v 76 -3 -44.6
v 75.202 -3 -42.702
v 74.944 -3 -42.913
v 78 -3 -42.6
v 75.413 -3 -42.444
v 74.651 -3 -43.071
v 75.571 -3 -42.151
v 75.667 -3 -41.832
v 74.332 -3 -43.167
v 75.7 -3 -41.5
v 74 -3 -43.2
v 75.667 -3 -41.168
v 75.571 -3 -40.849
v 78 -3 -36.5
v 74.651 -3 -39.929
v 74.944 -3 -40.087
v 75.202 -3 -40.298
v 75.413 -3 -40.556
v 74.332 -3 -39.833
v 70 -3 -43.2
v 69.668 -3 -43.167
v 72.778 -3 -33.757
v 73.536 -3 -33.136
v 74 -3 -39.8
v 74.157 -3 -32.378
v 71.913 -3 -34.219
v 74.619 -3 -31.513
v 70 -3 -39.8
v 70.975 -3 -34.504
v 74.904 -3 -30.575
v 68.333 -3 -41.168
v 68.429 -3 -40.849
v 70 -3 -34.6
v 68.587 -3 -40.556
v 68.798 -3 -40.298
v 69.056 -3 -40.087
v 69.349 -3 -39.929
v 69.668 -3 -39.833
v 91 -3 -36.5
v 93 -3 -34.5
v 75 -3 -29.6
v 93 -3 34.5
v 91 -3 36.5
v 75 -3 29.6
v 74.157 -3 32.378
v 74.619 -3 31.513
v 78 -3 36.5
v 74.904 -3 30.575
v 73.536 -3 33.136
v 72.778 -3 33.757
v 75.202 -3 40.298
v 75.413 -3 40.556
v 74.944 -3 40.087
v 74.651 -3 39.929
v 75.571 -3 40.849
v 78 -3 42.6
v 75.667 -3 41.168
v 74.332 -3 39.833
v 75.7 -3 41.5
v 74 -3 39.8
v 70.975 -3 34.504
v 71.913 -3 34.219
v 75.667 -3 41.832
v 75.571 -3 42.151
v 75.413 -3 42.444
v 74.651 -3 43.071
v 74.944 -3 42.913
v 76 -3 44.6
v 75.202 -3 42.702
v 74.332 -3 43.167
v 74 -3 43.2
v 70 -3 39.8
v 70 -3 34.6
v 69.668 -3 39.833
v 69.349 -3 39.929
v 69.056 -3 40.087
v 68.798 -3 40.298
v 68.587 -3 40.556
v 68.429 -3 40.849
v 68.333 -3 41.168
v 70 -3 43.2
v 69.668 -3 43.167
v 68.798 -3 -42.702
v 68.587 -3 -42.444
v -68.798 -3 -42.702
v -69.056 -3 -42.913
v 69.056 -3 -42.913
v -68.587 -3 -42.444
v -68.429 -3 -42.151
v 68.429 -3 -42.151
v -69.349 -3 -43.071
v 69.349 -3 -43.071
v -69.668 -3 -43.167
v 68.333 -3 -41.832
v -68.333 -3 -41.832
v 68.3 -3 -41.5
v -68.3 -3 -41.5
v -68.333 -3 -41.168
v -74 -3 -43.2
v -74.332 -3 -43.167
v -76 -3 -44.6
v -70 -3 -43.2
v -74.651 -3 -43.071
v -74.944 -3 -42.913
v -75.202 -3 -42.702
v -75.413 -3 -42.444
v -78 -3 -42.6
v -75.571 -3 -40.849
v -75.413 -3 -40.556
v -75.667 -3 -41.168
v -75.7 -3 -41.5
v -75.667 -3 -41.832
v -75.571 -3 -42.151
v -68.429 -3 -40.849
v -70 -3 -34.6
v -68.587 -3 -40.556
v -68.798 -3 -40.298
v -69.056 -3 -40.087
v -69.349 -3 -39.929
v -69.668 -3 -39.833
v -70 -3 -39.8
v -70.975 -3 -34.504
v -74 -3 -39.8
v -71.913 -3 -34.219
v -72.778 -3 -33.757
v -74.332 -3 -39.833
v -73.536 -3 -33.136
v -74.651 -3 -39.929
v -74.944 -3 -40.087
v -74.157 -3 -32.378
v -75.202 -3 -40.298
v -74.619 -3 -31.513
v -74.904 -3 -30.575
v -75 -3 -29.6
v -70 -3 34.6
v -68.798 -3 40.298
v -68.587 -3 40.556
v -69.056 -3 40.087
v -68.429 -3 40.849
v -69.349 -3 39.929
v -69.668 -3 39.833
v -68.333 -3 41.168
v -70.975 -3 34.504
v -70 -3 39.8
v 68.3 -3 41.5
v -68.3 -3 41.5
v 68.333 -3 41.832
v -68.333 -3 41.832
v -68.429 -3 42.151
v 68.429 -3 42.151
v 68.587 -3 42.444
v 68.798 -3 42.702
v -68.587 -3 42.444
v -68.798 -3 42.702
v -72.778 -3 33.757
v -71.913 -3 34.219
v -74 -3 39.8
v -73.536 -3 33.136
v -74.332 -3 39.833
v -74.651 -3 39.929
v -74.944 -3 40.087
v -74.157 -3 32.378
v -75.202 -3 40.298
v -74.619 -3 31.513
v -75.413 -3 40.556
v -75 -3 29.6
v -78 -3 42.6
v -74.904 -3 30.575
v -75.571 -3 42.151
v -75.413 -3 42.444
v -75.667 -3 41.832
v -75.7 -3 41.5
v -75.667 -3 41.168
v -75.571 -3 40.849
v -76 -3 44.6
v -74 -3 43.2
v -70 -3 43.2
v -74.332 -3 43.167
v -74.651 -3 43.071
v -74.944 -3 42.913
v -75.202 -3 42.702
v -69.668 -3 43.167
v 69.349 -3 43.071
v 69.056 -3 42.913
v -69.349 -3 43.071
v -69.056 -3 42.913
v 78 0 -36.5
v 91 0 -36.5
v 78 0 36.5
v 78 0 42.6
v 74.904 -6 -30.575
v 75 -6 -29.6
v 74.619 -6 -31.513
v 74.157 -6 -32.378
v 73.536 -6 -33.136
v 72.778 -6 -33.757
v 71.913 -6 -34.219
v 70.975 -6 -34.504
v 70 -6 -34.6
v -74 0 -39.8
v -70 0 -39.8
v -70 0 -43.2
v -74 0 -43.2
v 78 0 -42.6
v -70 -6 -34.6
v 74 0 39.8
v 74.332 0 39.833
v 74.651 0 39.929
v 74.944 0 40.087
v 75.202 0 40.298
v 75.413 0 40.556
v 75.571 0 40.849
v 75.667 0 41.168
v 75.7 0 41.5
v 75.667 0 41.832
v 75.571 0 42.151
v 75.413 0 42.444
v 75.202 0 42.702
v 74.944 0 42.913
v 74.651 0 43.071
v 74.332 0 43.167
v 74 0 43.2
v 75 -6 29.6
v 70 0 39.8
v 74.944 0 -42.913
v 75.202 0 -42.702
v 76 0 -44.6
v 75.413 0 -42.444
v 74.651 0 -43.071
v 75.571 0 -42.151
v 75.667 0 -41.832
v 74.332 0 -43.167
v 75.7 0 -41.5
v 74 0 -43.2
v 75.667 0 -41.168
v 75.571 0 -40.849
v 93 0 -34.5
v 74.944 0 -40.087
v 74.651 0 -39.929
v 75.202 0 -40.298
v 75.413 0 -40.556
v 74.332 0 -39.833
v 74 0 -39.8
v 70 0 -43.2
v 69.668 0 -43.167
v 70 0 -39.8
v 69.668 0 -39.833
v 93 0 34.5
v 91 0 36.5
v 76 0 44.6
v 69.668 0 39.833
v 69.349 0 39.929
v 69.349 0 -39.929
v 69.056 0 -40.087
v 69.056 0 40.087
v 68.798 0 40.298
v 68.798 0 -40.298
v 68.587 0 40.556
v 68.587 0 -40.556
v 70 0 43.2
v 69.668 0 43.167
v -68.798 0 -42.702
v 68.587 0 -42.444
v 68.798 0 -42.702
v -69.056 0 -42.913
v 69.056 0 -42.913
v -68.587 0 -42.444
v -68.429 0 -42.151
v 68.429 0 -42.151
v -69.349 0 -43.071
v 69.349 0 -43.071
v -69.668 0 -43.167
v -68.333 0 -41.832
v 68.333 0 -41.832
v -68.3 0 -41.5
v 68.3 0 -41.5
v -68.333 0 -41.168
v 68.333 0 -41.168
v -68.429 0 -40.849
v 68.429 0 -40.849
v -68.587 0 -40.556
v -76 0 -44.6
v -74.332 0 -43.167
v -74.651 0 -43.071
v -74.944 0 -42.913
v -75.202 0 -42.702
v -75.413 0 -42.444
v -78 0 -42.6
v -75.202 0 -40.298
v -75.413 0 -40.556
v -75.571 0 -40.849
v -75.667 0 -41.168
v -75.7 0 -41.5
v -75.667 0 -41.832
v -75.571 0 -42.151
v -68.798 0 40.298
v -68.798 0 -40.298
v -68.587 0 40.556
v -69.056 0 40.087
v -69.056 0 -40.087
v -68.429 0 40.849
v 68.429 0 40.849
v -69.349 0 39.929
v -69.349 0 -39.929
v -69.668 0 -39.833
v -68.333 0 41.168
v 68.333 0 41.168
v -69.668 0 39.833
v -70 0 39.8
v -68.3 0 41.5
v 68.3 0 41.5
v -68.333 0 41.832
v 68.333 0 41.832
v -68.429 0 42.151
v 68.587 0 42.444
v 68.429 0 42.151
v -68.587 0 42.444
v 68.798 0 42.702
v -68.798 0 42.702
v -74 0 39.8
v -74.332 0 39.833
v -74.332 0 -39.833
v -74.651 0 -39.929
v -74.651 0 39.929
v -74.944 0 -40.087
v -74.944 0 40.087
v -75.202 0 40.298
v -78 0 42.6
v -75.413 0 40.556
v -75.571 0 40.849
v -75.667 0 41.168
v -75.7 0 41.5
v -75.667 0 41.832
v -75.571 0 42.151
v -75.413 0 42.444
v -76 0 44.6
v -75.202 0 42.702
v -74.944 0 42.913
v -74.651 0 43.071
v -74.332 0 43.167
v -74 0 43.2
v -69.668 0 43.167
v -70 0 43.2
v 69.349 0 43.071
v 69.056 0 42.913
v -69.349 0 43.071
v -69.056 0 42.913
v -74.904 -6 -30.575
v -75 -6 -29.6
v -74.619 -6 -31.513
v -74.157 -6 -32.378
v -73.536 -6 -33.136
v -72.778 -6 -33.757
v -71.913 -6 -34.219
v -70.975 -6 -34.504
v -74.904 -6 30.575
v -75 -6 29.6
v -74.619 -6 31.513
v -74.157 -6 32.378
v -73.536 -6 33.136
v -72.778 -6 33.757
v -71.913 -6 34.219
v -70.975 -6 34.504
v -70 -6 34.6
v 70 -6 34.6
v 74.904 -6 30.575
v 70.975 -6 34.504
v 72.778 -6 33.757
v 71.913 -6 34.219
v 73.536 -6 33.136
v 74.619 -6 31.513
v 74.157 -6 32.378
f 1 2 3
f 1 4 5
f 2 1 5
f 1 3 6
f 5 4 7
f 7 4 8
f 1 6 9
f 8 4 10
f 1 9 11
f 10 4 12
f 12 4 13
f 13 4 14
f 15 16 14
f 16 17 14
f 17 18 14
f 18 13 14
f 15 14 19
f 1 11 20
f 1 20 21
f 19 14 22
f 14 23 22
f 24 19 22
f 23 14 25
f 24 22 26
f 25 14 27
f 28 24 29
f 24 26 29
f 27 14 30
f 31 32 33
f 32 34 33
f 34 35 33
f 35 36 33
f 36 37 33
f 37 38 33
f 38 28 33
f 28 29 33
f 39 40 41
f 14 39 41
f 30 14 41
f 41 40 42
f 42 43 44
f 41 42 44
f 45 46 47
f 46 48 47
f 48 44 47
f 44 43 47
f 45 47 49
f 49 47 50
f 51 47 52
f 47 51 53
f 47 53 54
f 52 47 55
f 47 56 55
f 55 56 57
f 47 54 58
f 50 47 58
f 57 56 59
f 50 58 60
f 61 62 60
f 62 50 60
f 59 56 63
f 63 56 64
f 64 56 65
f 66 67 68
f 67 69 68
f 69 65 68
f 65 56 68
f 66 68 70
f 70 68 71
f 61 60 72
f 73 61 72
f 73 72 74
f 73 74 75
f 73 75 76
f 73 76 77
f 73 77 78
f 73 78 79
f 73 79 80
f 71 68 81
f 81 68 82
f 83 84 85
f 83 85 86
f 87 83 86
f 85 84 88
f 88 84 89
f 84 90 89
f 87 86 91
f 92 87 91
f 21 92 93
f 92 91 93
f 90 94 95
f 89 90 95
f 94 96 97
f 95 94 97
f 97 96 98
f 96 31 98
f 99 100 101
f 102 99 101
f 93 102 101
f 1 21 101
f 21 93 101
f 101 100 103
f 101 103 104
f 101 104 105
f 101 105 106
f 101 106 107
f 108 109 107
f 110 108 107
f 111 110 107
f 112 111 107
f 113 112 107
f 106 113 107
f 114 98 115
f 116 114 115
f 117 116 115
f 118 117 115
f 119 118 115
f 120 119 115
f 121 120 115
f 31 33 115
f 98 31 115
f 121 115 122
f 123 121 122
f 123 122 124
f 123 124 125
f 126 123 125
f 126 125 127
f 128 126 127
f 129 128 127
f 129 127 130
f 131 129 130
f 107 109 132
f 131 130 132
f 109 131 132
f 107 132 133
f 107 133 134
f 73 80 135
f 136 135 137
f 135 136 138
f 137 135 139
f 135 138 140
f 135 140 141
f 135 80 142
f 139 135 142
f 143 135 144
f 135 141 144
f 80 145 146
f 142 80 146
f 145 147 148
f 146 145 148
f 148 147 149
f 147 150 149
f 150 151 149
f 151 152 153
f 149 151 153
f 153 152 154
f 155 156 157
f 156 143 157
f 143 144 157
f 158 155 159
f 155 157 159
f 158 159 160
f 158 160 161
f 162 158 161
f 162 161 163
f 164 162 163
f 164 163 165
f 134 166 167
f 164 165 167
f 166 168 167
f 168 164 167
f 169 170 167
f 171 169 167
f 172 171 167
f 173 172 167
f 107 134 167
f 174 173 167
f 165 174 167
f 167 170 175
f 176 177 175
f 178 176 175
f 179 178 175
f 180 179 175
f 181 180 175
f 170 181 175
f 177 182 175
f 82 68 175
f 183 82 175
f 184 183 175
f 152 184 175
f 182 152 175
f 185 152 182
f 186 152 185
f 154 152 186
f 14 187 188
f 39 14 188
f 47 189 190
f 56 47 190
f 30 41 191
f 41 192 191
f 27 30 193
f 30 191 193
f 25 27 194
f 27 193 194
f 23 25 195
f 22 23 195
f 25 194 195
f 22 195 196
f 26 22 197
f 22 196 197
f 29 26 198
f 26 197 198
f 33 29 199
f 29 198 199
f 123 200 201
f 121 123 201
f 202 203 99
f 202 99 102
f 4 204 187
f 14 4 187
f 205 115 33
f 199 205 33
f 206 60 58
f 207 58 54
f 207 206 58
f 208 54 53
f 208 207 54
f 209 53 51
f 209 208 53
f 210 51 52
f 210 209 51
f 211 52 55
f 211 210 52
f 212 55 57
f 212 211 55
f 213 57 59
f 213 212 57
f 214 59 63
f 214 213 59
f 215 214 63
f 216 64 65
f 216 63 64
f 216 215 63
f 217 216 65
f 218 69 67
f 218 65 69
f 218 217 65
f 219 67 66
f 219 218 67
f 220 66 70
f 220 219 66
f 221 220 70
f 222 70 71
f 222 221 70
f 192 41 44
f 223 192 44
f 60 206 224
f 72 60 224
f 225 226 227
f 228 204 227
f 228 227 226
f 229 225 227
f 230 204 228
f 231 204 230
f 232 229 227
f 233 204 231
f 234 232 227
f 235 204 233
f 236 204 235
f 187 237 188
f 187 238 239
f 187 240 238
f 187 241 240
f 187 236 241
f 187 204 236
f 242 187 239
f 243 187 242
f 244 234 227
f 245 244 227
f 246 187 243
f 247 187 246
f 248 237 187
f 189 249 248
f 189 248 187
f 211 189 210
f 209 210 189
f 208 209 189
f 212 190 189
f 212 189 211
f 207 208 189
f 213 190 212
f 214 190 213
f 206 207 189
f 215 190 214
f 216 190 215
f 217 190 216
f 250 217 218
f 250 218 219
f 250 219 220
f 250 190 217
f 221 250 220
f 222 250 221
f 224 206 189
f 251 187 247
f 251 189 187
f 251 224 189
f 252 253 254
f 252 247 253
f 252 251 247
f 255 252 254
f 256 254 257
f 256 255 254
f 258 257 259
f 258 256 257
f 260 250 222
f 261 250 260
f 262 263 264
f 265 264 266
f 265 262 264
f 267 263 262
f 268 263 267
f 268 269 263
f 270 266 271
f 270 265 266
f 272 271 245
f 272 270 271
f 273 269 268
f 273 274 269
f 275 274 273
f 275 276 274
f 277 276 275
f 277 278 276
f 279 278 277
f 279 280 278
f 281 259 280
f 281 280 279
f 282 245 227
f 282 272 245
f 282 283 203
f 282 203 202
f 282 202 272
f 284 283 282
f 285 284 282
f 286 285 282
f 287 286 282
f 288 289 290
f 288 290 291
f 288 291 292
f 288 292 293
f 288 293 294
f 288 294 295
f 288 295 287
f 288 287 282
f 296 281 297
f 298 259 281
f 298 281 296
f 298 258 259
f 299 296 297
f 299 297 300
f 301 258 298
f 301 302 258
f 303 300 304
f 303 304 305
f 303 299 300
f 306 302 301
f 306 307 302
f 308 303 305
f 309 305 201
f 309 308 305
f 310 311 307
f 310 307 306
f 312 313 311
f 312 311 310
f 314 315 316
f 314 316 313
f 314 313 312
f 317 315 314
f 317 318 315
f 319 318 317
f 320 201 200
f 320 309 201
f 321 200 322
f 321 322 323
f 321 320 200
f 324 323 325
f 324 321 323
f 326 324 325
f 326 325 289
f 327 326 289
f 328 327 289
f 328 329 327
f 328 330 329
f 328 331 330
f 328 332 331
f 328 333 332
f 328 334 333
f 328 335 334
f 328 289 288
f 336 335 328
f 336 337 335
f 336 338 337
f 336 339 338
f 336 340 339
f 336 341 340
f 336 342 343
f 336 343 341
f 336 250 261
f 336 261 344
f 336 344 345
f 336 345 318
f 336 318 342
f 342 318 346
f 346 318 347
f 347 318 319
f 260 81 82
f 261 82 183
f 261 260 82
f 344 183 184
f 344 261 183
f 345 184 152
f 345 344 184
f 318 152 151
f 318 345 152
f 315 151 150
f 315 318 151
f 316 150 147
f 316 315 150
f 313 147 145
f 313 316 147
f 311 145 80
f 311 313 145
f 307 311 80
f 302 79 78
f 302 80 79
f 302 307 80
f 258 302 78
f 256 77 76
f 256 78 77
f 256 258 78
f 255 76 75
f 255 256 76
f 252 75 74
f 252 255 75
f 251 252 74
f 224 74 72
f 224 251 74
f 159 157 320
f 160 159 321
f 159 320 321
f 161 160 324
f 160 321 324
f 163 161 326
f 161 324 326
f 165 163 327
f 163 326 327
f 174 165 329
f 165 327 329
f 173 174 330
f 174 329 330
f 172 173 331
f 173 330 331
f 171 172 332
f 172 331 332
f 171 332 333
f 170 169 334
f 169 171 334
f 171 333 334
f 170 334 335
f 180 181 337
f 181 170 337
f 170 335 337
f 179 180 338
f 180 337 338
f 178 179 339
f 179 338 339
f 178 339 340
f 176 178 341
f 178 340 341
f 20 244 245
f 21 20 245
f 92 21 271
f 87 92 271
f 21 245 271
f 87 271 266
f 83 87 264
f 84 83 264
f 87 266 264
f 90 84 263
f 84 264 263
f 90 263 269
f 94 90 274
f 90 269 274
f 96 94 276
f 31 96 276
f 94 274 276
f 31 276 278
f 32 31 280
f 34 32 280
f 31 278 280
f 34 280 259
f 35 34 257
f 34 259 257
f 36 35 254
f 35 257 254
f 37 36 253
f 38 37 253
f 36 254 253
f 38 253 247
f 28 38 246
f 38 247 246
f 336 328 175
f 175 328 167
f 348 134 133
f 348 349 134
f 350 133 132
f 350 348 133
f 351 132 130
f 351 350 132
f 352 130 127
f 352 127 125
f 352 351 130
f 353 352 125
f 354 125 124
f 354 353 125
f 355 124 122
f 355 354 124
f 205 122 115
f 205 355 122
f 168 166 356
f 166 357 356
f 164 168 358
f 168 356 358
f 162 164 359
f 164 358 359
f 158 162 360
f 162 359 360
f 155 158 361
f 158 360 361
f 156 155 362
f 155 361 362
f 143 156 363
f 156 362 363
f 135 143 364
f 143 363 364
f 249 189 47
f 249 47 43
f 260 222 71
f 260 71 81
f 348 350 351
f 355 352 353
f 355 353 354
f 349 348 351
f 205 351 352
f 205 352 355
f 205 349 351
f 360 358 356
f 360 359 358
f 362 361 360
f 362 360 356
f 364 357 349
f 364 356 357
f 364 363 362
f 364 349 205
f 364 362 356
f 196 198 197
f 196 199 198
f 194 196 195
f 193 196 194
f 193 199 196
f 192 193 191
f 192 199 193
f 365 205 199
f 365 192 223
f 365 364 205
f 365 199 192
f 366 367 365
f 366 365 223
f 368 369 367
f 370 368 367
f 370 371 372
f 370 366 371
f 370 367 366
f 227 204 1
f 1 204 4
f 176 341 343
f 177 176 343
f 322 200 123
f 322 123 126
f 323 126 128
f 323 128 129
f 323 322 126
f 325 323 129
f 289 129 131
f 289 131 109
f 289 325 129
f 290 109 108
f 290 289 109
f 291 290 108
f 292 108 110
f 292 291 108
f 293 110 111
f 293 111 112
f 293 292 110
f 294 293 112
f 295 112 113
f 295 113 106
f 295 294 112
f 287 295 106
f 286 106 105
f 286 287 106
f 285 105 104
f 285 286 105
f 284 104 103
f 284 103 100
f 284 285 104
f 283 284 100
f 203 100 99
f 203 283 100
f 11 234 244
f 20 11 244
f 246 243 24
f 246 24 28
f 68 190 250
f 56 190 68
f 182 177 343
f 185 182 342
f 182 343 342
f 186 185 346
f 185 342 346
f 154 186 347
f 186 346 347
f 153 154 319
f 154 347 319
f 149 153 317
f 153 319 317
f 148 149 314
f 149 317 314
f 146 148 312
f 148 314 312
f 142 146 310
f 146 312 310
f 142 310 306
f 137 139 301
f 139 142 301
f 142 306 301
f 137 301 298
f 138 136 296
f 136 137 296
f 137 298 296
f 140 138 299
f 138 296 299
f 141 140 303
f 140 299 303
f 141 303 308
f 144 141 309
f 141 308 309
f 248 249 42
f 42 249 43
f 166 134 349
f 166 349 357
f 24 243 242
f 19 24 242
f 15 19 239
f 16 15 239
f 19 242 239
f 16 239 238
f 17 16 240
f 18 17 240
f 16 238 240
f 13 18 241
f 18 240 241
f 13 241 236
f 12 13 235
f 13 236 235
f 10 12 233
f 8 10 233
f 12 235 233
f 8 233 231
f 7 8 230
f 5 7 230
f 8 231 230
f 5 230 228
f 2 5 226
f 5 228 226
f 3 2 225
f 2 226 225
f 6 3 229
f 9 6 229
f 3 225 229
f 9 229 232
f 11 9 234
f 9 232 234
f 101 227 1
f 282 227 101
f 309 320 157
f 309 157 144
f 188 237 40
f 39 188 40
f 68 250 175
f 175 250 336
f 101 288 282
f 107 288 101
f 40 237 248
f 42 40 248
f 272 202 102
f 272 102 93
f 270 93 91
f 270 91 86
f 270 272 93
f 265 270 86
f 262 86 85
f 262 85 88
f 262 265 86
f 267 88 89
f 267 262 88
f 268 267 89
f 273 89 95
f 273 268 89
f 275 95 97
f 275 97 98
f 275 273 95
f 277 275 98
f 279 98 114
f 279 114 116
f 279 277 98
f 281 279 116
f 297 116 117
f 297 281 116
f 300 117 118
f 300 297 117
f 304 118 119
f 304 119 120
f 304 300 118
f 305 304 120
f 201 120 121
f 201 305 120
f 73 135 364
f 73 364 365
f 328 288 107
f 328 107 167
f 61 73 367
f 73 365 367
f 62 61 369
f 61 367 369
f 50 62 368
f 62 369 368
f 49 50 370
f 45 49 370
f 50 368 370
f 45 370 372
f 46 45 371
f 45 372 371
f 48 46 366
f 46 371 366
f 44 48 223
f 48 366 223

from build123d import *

# Parameters (mm, degrees)
SKETCH011_W     = 78
SKETCH011_H     = 89.2
PAD007_DEPTH    = 3
POCKET004_DEPTH = 5
CHAMFER006_SIZE = 2
SKETCH013_W     = 15
SKETCH013_H     = 73
PAD008_DEPTH    = 3
CHAMFER007_SIZE = 2
SKETCH014_W     = 150
SKETCH014_H     = 69.2
PAD009_DEPTH    = 3
FILLET002_R     = 5


with BuildPart() as part:
    # Sketch011 (on XZ_Plane007 of Origin014) → Pad007 (new body)
    with BuildSketch(Plane.XZ):
        with Locations((39, 0)):
            Rectangle(SKETCH011_W, SKETCH011_H)
    extrude(amount=PAD007_DEPTH)

    # Sketch012 (on XZ_Plane007 of Origin014) → Pocket004 (cut)
    with BuildSketch(Plane.XZ):
        with BuildLine():
            ThreePointArc((74, 39.8), (75.7, 41.5), (74, 43.2))
            Line((74, 43.2), (70, 43.2))
            ThreePointArc((70, 43.2), (68.3, 41.5), (70, 39.8))
            Line((74, 39.8), (70, 39.8))
        make_face()
    pocket004 = extrude(amount=POCKET004_DEPTH, mode=Mode.SUBTRACT)

    # Mirrored004: Pocket004 across XY
    add(pocket004.mirror(Plane.XY), mode=Mode.SUBTRACT)

    # Mirrored005: part across YZ


with BuildPart() as part_1:
    add(part.part)
    add(part.part.mirror(Plane.YZ))

    # Chamfer006
    chamfer006_edges = [part_1.edges().sort_by_distance(p)[0] for p in [
        (78, -1.5, -44.6),
        (78, -1.5, 44.6),
        (-78, -1.5, -44.6),
        (-78, -1.5, 44.6),
    ]]
    chamfer(chamfer006_edges, length=CHAMFER006_SIZE)

    # Sketch013 (on XZ_Plane007 of Origin014) → Pad008 (join)
    with BuildSketch(Plane.XZ):
        with Locations((85.5, 0)):
            Rectangle(SKETCH013_W, SKETCH013_H)
    extrude(amount=PAD008_DEPTH)

    # Chamfer007
    chamfer007_edges = [part_1.edges().sort_by_distance(p)[0] for p in [
        (93, -1.5, -36.5),
        (93, -1.5, 36.5),
    ]]
    chamfer(chamfer007_edges, length=CHAMFER007_SIZE)

    # Sketch014 (on Face5 of Chamfer007) → Pad009 (join)
    with BuildSketch(Plane.XZ.offset(3)):
        Rectangle(SKETCH014_W, SKETCH014_H)
    extrude(amount=PAD009_DEPTH)

    # Fillet002
    fillet002_edges = [part_1.edges().sort_by_distance(p)[0] for p in [
        (75, -4.5, 34.6),
        (75, -4.5, -34.6),
        (-75, -4.5, 34.6),
        (-75, -4.5, -34.6),
    ]]
    fillet(fillet002_edges, radius=FILLET002_R)


solid = part_1.part
